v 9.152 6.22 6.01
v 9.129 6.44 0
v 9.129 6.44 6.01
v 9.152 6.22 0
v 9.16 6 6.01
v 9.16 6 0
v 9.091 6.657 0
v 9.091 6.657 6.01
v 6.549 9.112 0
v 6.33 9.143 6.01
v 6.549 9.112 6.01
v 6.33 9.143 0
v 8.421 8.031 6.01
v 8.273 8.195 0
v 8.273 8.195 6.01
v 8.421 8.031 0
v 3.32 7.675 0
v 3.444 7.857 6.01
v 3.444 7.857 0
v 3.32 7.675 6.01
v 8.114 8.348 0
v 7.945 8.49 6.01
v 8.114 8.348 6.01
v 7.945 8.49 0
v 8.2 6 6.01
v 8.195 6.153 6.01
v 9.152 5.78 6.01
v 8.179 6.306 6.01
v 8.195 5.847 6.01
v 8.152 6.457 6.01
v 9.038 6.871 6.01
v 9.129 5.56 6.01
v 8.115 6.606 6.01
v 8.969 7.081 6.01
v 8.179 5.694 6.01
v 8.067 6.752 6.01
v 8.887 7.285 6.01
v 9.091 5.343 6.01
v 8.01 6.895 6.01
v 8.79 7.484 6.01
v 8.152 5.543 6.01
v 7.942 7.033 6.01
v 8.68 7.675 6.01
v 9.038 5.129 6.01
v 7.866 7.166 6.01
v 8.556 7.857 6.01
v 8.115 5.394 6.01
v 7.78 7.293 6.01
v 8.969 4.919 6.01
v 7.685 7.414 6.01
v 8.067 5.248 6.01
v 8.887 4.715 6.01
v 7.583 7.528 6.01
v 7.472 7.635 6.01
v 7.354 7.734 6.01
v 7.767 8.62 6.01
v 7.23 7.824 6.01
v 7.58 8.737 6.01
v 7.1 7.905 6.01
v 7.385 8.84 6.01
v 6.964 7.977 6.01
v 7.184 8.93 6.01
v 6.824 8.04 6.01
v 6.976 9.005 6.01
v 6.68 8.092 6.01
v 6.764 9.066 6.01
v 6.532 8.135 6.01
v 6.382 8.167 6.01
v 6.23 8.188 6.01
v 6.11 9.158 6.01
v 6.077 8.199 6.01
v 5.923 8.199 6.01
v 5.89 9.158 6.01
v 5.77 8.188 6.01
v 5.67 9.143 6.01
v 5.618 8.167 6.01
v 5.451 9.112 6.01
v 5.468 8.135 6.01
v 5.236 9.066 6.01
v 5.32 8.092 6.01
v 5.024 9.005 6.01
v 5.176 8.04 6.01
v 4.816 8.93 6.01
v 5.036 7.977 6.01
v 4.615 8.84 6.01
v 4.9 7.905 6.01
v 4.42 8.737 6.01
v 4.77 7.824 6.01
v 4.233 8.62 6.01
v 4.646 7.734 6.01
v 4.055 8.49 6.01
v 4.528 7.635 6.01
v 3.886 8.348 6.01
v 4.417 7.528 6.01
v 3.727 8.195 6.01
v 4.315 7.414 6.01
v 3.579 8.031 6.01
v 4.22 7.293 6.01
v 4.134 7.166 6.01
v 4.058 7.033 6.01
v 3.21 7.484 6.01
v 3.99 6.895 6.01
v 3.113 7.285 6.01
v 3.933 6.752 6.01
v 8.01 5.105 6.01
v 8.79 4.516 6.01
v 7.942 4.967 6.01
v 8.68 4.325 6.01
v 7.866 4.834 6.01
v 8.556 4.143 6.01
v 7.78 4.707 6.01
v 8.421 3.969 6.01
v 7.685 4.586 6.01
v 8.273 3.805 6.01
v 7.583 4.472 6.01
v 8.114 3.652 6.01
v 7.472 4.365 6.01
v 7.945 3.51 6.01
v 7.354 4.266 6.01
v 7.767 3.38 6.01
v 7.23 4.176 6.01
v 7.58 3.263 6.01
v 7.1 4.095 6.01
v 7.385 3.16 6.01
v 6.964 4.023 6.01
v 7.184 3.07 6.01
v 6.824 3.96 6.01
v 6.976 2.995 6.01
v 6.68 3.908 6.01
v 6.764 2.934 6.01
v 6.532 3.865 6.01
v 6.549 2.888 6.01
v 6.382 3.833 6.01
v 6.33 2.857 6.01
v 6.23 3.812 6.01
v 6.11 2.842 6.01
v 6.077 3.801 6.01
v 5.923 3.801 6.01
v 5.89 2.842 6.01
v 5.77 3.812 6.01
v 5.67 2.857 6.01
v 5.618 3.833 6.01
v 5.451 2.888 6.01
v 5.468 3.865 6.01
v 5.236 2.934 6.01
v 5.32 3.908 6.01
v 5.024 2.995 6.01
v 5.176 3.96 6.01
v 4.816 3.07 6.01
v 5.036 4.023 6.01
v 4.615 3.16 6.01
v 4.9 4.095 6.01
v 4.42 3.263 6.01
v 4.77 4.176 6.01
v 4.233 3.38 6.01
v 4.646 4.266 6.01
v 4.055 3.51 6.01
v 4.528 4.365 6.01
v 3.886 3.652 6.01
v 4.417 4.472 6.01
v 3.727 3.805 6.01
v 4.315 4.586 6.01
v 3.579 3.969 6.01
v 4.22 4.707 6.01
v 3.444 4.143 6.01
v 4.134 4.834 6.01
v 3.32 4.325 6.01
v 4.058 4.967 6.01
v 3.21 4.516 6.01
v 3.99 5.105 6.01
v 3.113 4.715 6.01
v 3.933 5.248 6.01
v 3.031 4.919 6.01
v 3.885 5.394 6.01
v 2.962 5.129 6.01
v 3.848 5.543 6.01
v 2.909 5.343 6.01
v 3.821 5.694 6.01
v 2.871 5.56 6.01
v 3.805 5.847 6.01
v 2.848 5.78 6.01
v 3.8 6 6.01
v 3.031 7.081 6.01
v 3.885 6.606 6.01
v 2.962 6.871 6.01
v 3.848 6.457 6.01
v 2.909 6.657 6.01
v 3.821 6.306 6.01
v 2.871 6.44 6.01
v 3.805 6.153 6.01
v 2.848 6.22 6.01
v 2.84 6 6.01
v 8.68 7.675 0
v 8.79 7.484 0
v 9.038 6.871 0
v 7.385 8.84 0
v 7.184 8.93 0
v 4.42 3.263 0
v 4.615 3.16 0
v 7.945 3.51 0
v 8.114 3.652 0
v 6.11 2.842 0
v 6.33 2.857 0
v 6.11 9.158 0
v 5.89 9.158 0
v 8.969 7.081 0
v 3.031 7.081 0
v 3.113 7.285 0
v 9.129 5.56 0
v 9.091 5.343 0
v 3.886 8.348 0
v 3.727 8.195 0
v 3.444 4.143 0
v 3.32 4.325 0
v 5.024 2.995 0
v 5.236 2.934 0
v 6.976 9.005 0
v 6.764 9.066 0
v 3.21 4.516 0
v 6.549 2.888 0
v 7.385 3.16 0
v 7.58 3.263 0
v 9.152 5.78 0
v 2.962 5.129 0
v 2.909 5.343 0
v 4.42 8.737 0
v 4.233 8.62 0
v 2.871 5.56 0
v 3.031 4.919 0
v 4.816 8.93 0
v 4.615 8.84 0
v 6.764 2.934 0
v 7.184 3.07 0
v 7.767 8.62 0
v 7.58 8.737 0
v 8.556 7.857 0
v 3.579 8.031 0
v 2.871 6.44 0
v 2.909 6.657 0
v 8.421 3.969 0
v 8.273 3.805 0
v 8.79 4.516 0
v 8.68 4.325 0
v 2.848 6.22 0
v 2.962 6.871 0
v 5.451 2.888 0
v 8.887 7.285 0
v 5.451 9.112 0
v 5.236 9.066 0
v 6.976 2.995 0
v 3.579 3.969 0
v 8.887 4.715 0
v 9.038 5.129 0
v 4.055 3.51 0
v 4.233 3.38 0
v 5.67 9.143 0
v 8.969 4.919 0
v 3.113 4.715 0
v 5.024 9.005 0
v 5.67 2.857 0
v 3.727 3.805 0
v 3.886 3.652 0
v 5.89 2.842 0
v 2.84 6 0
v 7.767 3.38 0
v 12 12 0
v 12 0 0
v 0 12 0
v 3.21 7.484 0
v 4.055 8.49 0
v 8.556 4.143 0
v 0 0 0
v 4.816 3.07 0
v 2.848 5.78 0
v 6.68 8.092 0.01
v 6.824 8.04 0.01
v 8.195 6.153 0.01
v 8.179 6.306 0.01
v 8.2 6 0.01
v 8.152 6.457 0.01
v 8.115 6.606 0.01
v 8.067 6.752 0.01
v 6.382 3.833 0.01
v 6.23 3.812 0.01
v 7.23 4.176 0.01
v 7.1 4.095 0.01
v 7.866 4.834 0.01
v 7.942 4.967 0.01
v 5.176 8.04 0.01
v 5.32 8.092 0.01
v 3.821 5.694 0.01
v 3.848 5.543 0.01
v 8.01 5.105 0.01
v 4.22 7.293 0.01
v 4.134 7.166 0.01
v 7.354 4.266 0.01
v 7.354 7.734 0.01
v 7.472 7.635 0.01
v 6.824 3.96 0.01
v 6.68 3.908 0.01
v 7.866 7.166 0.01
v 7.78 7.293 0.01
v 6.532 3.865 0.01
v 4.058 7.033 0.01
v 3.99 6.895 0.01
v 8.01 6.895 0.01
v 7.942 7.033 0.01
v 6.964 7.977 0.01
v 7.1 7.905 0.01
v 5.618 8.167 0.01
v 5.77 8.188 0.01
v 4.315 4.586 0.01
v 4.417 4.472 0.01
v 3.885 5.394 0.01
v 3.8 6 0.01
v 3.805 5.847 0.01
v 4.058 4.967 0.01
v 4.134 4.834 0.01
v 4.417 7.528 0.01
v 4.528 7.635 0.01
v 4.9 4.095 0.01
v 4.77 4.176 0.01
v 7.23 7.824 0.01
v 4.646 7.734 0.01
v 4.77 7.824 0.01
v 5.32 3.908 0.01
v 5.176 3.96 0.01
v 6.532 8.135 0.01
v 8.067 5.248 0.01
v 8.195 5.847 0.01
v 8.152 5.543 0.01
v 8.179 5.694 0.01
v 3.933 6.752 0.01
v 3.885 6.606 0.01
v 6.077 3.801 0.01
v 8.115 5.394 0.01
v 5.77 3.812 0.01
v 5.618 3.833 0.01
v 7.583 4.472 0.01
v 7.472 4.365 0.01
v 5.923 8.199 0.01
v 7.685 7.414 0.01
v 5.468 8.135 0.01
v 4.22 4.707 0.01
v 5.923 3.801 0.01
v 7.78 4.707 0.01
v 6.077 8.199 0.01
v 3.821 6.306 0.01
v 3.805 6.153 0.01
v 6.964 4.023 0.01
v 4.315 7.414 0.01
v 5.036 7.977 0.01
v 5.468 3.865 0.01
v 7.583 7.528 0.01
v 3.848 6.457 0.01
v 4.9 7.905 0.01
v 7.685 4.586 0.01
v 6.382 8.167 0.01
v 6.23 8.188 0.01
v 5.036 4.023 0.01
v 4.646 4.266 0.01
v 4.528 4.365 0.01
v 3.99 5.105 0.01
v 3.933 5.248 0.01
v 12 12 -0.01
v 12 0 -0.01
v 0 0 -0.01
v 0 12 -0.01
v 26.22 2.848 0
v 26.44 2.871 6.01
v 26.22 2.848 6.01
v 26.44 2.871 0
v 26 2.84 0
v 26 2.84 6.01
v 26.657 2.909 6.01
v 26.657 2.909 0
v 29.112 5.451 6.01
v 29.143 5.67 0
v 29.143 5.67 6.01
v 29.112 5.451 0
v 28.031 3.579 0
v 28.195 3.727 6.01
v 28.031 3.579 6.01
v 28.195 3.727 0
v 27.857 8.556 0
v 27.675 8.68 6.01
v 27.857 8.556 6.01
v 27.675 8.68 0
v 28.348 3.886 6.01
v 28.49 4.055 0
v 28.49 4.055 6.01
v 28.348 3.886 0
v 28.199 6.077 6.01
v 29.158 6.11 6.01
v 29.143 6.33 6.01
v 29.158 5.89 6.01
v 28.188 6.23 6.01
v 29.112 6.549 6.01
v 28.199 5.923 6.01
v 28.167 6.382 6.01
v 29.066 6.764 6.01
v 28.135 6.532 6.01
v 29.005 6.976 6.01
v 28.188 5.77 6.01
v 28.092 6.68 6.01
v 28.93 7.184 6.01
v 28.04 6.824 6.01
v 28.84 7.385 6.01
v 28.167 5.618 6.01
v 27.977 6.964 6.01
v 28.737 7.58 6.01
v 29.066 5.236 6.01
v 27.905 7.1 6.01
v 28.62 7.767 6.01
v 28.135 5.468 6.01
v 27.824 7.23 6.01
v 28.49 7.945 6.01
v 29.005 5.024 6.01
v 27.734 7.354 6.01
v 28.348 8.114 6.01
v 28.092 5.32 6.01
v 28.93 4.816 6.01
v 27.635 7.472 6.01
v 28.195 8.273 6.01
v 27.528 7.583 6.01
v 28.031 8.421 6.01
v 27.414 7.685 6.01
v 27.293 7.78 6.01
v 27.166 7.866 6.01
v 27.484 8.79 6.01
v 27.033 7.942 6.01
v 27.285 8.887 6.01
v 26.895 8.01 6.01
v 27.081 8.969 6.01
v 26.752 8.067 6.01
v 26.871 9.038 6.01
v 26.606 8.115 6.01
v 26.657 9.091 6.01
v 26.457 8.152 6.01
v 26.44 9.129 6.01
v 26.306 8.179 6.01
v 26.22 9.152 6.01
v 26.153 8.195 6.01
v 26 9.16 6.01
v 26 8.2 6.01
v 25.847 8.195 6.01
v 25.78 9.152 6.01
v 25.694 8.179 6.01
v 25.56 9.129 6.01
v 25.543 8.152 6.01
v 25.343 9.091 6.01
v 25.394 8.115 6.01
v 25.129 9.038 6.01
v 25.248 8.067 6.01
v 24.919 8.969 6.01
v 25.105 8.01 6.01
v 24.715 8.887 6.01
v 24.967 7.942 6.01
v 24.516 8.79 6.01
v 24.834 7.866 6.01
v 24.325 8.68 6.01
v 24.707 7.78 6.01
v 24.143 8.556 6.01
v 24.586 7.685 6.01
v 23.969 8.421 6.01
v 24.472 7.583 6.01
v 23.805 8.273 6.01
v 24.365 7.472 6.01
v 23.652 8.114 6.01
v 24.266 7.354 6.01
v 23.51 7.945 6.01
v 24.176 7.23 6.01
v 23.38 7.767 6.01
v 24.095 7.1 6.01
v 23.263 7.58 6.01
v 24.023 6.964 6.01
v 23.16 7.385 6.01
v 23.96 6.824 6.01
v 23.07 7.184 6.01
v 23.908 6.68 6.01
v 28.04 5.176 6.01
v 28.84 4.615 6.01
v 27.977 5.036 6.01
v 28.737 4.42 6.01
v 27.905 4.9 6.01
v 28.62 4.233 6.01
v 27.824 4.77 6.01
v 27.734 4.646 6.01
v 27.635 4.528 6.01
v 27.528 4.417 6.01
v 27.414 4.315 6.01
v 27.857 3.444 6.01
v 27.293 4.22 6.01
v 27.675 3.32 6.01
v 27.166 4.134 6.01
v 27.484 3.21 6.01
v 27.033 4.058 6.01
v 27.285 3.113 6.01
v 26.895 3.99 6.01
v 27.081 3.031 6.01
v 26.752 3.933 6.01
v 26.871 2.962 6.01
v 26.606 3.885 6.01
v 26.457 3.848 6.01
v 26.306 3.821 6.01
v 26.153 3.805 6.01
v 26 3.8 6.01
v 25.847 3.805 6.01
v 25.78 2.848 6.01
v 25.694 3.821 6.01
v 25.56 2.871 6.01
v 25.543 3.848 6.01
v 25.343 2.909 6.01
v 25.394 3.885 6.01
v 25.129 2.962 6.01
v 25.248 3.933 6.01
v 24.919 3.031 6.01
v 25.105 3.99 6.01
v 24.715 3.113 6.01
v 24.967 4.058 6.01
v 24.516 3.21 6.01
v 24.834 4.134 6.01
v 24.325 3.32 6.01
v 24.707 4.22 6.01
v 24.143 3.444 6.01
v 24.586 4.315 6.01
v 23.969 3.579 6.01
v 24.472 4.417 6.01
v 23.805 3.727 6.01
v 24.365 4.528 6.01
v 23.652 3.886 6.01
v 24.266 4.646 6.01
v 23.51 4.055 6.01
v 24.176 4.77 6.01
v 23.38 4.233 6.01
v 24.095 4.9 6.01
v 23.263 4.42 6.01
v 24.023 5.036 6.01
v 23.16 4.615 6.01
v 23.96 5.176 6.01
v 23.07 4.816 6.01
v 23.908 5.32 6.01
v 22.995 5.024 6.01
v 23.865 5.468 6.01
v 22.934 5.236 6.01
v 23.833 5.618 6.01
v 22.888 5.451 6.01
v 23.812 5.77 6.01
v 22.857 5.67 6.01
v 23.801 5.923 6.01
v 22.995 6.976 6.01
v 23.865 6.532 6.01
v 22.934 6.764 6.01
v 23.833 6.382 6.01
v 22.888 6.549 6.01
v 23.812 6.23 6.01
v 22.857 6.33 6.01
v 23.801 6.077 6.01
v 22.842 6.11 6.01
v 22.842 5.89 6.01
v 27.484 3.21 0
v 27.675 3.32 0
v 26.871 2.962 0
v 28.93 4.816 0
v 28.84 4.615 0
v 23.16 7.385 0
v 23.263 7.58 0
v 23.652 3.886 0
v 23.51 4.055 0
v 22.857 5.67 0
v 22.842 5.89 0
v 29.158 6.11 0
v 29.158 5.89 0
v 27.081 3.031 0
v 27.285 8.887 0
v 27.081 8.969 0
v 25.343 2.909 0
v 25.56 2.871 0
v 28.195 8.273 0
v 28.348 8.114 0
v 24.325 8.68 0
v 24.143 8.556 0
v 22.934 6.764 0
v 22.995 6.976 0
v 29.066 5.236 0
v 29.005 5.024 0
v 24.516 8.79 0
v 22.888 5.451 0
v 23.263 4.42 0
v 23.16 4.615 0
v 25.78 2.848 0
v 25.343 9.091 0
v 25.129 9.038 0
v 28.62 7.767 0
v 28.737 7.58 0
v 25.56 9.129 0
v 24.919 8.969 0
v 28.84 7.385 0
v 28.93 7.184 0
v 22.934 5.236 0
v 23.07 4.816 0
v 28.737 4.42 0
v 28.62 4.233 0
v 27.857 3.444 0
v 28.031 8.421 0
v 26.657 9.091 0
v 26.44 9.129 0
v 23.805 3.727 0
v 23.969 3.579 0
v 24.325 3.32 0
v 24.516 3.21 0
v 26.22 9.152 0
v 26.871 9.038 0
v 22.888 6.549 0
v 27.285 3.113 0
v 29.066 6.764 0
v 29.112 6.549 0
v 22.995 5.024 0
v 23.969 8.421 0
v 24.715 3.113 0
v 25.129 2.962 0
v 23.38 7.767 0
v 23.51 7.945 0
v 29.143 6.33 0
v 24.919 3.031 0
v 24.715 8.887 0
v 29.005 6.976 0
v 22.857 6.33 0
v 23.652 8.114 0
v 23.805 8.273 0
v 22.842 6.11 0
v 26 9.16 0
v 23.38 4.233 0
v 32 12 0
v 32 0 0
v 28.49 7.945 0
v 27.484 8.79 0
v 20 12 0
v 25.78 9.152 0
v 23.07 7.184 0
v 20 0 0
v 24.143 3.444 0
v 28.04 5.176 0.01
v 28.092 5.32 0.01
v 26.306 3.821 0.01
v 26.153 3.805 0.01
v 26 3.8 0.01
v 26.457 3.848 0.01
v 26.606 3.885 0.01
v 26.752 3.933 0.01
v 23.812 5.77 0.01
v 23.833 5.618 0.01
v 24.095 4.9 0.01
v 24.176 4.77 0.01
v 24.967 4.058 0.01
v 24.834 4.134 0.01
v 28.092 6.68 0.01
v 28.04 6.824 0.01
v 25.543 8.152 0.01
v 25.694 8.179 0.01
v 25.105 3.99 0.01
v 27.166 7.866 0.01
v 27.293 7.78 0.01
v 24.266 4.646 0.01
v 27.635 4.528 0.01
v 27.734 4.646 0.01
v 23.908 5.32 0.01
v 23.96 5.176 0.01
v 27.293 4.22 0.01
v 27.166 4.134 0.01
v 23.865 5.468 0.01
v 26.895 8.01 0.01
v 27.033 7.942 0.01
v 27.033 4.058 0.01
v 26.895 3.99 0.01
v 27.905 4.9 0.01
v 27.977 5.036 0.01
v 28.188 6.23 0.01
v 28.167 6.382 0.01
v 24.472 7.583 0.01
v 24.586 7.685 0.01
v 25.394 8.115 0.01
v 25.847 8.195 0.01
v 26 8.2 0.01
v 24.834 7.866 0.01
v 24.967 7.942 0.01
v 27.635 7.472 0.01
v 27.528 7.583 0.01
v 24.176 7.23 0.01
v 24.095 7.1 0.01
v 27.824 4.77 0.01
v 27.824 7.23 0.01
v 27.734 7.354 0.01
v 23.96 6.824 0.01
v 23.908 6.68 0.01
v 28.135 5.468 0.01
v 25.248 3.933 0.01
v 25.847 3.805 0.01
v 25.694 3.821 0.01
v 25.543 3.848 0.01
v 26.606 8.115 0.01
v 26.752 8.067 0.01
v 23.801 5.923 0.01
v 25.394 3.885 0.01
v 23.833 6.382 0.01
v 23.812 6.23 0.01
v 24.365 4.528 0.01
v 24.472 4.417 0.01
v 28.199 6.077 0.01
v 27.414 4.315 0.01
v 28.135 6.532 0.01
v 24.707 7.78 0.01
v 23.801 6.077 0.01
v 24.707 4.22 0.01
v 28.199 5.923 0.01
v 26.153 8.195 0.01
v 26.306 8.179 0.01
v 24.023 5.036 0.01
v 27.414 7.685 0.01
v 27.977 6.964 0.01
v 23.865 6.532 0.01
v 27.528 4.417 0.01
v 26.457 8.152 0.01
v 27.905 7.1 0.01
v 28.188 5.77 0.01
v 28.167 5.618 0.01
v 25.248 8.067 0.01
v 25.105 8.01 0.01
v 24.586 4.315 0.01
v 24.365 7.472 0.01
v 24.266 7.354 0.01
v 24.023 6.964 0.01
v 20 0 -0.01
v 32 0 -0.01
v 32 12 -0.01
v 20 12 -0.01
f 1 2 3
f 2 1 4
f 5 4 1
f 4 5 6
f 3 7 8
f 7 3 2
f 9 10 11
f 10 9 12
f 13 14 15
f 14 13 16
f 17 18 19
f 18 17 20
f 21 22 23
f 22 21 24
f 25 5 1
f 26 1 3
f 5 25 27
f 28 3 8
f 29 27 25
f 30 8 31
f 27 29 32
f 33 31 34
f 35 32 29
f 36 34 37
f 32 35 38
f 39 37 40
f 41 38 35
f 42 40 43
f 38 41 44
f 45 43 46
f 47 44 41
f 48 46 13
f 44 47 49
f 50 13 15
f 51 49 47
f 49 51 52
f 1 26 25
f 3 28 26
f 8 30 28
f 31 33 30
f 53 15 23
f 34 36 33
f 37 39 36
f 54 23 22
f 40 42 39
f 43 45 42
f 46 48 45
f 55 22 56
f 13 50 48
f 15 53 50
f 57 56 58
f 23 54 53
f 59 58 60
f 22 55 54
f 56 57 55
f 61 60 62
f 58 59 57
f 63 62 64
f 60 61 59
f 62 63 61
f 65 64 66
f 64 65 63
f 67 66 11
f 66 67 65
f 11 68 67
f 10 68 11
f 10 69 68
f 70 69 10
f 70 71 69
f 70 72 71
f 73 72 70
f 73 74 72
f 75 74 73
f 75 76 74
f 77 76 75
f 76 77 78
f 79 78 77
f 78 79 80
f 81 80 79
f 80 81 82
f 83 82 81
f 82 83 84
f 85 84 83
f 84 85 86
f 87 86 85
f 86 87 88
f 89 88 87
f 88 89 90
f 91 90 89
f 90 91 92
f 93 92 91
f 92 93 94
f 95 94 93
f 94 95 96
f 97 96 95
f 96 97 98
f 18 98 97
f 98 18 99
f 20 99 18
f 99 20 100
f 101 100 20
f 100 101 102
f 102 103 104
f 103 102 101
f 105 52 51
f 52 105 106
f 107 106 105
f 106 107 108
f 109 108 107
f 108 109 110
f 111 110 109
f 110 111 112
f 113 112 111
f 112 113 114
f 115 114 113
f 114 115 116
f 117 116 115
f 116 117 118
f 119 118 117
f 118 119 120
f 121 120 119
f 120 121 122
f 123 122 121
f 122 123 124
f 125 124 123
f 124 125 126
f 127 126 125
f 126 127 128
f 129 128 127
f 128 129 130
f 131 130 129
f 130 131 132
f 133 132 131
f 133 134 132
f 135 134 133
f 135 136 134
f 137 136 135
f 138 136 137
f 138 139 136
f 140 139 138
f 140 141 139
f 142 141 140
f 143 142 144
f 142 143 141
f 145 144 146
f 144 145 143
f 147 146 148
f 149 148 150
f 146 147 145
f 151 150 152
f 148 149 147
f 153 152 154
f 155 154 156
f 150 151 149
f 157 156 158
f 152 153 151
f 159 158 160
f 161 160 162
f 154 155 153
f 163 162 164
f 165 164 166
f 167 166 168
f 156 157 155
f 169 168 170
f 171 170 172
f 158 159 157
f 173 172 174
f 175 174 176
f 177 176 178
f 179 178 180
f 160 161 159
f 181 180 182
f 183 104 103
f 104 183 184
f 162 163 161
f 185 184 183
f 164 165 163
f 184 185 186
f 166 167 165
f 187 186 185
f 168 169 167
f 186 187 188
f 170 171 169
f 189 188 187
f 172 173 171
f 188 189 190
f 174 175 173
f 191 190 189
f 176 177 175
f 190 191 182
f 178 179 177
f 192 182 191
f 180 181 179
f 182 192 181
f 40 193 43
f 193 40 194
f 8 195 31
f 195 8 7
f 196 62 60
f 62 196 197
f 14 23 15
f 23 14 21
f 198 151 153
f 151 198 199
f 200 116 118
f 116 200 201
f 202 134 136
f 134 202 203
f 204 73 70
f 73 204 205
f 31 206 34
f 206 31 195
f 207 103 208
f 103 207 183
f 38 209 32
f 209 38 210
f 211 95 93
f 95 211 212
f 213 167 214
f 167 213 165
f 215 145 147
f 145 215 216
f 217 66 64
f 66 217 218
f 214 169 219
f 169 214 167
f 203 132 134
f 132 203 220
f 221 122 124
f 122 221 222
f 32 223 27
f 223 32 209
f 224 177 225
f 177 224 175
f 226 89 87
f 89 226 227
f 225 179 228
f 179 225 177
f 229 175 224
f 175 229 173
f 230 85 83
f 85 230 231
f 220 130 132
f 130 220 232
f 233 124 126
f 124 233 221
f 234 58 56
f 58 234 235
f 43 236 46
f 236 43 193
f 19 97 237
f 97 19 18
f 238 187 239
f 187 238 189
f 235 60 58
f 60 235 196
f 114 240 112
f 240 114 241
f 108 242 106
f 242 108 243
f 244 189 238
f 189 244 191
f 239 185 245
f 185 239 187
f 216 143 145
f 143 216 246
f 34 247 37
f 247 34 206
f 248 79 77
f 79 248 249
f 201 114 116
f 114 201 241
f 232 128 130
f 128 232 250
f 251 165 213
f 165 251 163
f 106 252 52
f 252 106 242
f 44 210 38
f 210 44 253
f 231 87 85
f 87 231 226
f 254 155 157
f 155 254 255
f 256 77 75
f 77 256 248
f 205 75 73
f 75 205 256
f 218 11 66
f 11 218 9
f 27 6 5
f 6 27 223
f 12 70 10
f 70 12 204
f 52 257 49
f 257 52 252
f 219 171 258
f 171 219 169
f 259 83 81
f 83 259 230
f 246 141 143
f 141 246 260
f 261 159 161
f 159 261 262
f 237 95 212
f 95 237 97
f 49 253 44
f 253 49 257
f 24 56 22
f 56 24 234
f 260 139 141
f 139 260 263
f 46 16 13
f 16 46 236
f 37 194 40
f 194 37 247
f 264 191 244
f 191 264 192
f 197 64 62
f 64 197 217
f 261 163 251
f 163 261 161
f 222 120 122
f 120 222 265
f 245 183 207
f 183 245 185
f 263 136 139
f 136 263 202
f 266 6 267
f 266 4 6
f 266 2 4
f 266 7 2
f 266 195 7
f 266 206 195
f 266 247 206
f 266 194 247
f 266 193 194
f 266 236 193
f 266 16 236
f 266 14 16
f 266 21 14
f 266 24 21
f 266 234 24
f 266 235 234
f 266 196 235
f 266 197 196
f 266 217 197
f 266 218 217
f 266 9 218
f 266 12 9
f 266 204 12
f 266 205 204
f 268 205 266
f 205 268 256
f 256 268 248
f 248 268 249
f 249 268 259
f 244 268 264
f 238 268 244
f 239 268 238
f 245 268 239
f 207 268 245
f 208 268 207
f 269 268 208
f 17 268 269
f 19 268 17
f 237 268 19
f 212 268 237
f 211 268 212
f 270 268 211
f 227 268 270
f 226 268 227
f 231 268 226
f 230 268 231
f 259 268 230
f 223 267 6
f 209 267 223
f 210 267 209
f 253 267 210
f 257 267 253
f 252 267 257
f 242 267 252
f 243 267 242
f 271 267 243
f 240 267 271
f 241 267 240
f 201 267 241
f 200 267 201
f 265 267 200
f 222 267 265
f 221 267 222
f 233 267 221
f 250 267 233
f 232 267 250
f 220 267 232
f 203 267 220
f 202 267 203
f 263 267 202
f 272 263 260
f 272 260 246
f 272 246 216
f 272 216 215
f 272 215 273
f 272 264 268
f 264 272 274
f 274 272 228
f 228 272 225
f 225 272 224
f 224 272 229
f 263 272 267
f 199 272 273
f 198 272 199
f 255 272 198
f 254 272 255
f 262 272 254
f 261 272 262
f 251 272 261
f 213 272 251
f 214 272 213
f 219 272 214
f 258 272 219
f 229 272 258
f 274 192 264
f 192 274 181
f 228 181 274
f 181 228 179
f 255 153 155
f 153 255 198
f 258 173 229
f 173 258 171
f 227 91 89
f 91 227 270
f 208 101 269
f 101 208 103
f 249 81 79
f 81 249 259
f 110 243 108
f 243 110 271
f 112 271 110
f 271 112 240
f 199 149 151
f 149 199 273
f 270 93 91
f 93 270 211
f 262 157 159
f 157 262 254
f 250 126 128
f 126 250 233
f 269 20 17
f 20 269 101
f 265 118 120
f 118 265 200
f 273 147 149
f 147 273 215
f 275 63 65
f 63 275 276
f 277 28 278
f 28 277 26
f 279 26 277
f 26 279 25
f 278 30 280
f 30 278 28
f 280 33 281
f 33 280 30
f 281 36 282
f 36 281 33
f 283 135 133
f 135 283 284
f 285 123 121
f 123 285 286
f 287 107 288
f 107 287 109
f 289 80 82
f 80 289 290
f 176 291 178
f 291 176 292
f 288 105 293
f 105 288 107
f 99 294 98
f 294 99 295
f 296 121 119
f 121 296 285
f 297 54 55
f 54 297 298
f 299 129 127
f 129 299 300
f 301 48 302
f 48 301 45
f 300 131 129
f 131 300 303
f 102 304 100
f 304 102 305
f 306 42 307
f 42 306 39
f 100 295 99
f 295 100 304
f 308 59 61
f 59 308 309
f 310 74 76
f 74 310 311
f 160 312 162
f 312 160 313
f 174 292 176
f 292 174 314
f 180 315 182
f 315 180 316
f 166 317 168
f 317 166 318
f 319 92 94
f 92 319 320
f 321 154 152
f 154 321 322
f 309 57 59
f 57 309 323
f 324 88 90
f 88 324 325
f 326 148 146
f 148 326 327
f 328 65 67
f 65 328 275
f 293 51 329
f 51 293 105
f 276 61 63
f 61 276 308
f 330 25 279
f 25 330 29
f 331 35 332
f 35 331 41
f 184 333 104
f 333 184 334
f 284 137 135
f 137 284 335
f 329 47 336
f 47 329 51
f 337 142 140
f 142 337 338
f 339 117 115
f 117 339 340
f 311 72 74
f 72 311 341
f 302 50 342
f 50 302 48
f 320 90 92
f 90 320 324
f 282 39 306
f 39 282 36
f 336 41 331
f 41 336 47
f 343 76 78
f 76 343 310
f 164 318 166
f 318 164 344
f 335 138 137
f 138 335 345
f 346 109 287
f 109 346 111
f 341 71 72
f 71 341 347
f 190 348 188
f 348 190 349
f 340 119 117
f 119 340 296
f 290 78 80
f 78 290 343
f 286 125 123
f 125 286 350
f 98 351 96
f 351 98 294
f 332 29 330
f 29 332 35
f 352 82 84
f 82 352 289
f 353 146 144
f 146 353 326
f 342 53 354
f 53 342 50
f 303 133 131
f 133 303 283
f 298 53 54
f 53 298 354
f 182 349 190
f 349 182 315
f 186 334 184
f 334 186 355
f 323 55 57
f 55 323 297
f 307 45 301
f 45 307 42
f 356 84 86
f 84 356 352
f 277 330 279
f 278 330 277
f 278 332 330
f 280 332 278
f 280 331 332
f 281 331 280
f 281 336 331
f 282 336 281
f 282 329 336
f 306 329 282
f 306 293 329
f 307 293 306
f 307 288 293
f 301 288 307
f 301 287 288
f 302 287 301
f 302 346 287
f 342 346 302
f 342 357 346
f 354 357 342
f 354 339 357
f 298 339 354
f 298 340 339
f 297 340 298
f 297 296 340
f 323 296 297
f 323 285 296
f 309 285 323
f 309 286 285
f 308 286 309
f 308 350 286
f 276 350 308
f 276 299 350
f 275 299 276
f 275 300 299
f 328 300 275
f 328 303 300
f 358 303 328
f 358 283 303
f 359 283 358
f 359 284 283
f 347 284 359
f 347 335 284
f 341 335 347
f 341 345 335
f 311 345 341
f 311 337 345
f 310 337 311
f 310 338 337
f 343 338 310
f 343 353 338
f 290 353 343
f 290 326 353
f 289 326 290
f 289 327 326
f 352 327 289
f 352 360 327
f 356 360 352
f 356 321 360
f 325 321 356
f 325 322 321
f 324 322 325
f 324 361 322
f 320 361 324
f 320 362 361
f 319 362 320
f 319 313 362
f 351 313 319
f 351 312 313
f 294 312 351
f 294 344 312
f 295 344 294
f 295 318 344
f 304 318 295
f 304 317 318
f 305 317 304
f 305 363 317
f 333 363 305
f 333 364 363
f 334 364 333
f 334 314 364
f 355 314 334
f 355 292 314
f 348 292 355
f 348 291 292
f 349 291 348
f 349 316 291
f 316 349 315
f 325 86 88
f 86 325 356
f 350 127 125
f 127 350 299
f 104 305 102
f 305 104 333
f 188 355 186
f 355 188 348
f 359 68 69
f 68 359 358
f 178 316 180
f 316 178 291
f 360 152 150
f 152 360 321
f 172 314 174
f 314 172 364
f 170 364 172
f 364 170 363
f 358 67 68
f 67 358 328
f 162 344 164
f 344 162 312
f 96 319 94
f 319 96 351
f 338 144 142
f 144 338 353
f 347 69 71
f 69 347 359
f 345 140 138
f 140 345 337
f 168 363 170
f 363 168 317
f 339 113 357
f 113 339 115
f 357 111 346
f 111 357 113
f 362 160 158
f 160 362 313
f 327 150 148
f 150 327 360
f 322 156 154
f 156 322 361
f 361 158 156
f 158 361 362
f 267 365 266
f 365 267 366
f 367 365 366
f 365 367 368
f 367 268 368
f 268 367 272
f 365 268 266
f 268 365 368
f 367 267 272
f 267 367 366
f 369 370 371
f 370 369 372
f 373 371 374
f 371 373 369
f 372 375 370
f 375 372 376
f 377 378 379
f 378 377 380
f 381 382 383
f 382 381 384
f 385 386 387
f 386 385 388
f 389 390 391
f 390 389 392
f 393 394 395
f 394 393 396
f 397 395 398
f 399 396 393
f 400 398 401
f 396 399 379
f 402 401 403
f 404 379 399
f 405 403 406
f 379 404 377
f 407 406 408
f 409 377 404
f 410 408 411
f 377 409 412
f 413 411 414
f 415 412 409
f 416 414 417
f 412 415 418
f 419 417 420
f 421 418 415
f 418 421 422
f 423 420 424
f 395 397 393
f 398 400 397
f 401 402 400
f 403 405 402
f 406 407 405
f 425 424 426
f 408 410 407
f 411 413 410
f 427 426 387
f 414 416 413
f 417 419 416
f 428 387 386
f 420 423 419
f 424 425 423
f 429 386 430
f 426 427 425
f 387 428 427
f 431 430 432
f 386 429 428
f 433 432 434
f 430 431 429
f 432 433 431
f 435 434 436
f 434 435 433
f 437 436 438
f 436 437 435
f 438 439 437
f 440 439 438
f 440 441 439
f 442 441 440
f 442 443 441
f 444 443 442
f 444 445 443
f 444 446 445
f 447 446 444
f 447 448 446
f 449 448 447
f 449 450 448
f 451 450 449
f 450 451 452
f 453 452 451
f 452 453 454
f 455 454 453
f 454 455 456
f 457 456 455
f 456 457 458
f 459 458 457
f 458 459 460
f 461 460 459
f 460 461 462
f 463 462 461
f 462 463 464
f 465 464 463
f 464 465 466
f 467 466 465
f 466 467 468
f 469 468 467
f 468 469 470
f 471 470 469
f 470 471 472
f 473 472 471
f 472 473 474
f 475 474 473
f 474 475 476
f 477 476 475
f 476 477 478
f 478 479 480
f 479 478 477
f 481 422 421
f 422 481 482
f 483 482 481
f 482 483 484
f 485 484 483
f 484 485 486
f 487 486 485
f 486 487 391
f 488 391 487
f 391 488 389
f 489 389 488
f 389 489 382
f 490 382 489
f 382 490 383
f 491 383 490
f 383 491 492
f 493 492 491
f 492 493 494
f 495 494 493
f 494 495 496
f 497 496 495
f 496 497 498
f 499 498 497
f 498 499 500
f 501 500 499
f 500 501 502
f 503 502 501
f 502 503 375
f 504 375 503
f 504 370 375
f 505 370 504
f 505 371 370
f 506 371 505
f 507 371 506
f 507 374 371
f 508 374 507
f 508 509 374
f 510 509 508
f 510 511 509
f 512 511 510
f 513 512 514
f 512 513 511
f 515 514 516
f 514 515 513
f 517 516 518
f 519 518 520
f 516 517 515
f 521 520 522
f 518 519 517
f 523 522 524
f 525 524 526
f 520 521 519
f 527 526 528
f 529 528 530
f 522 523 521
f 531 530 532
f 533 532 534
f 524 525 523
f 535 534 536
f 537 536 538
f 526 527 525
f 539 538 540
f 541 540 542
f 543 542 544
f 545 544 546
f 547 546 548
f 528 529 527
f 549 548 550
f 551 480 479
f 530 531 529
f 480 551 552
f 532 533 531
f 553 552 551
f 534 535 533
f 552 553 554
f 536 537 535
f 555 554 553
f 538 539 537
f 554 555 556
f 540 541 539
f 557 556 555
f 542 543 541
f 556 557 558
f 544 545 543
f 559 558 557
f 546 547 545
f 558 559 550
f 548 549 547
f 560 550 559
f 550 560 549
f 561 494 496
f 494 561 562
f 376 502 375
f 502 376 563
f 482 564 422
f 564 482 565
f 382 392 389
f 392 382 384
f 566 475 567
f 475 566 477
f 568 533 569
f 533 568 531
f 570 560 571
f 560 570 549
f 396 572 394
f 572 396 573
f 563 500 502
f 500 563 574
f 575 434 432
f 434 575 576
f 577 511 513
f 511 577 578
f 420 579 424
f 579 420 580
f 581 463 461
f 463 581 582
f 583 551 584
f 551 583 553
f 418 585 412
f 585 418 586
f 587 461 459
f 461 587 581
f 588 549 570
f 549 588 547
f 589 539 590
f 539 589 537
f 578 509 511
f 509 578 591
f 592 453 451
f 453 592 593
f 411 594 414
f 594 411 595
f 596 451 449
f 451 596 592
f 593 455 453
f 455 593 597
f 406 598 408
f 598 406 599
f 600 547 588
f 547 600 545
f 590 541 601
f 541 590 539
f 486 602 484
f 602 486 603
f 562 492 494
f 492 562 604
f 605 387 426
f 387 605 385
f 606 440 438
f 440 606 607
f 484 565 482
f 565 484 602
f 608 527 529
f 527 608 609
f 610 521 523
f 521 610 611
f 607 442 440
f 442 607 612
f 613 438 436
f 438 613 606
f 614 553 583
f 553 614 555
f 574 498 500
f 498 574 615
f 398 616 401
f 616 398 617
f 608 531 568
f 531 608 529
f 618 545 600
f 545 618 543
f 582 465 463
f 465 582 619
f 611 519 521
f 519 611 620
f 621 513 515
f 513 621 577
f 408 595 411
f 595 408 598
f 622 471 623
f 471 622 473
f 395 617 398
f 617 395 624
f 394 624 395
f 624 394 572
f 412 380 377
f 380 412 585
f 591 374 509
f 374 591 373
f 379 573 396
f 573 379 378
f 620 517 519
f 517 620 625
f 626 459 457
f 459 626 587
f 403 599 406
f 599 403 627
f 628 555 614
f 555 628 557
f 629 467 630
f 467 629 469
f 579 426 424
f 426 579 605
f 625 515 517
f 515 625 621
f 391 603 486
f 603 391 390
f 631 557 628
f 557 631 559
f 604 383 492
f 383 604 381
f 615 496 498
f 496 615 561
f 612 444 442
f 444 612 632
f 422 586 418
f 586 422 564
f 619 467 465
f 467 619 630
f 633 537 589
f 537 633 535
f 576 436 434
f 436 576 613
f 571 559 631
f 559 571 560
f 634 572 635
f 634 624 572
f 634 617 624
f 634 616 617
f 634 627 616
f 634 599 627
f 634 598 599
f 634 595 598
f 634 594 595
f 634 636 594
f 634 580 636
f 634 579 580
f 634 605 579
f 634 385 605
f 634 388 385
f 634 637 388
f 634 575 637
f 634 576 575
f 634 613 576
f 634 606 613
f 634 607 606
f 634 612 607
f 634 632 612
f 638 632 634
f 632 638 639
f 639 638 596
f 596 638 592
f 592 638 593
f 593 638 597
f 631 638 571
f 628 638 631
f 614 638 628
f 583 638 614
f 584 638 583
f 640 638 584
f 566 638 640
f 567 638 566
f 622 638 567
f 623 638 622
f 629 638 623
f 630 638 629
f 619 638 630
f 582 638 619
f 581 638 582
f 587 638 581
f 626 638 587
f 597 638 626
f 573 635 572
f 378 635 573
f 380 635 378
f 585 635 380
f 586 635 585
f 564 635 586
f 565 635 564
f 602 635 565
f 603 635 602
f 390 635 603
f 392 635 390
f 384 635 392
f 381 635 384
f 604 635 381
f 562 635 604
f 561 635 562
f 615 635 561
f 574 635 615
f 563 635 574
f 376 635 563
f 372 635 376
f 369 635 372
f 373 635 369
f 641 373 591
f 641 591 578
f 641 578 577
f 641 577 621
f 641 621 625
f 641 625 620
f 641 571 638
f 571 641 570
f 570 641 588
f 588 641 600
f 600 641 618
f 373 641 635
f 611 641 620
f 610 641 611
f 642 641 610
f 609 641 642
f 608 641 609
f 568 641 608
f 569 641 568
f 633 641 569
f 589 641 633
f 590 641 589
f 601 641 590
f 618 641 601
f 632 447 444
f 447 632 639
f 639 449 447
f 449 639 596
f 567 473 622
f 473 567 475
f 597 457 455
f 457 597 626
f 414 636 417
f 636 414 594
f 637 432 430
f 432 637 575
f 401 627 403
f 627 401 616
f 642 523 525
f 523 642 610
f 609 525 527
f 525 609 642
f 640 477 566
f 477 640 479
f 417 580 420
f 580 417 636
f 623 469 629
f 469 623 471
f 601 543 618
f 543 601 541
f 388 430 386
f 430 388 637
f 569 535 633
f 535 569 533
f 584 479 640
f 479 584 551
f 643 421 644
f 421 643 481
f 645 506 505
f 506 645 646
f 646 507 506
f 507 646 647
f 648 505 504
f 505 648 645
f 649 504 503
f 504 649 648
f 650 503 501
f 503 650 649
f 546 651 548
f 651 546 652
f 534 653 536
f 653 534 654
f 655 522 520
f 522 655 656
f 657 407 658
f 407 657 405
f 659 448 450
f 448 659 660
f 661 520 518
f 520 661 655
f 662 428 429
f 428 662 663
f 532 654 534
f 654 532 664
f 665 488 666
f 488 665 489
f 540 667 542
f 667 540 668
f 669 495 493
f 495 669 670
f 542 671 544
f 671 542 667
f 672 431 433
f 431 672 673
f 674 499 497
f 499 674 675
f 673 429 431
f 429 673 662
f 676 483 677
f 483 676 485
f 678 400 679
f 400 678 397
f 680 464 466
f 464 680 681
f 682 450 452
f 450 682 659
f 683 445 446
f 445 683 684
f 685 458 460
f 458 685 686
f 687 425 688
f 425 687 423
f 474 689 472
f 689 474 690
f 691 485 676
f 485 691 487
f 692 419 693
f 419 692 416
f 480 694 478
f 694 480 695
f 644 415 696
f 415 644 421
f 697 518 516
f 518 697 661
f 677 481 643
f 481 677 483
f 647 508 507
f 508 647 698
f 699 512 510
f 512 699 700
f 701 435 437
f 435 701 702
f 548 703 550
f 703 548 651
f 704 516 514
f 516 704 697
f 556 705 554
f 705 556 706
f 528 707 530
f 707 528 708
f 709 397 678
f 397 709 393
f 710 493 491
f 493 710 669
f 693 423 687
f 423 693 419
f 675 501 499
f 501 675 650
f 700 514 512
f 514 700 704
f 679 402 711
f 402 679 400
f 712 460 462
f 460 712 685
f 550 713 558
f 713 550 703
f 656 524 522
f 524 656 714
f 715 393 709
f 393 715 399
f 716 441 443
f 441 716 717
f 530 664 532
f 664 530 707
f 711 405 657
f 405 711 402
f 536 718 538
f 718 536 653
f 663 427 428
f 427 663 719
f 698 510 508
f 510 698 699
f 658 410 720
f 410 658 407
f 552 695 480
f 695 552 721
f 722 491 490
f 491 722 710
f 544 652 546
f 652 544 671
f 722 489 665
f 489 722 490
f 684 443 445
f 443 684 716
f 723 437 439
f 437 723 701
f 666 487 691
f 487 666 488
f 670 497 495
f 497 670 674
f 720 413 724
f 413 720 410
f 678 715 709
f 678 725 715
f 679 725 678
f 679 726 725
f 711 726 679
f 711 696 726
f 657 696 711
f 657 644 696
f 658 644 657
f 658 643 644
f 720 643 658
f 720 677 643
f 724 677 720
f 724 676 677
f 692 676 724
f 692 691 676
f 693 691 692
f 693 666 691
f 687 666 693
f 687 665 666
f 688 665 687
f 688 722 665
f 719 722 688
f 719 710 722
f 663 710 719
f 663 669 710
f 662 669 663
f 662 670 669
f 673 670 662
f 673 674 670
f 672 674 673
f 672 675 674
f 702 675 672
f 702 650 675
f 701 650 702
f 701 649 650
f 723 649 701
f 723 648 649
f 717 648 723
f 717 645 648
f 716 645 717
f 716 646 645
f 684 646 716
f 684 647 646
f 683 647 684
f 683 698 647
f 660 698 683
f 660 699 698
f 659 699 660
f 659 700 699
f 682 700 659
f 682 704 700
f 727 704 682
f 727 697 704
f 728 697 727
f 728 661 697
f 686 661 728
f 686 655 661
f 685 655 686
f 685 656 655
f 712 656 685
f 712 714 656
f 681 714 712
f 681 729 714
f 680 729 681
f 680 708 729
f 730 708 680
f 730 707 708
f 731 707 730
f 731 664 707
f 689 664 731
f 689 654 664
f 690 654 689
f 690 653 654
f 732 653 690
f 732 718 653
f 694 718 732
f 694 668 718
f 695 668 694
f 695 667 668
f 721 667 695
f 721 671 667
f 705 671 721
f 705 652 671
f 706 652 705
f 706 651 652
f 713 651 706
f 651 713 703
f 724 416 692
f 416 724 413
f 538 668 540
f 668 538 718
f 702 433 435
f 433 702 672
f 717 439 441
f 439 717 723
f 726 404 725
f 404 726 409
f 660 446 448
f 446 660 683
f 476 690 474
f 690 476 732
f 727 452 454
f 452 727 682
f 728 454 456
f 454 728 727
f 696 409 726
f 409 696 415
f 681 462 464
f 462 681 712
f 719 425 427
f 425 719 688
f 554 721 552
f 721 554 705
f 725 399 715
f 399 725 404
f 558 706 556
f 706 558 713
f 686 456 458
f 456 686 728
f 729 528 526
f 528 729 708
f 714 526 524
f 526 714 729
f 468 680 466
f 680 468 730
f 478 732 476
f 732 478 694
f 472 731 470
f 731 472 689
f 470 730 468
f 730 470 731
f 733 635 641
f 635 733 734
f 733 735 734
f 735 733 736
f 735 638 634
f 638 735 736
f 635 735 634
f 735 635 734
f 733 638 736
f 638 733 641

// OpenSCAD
// file: ../../Base/Boxes.scad
// Fischertechnik Box Foundation
// Pre-designed Boxes

use <Constants.scad>

include <PlacementOptions.scad>

box190Width = 190;
box190Depth = 130;
box130Width = 130;
box130Depth = 95;

// Values are from an original ec3 box
topBottomDifference = 1.5;
outerHeight = 40;
innerHeight = 38.2;
baseThickness = outerHeight - innerHeight;
stackExcess = 5.7;
radius = 3.5;
wallThickness = 1.5;
tolerance = 0.2;
stackOffset = innerHeight - stackExcess;

boxUsageHeight = stackOffset;
boxWallThickness = wallThickness;
boxBaseThickness = baseThickness;
boxWebWidth = 3.0;

// getBoxWallThickness()
// Gets the wall thickness of a Fischertechnik Box
function getBoxWallThickness() = boxWallThickness;

// getBoxUsageHeight()
// Gets the usable height of a Fischertechnik box
function getBoxUsageHeight() = boxUsageHeight;

// getBoxInnerHeight()
// Gets the inner height of a Fischertechnik box, including the stack excess
function getBoxInnerHeight() = innerHeight;

// getBoxBaseThickness()
// Gets the thickness of the Fischertechnik box base.
function getBoxBaseThickness() = boxBaseThickness;

// getBoxWebWidth()
// Gets the width of a box web
function getBoxWebWidth() = boxWebWidth;

// getBox190Space()
// Gets the usable inner space of a Box 190 as an x/y-list
function getBox190Space() = [
    box190Width - 2*getBoxWallThickness() - topBottomDifference, 
    box190Depth - 2*getBoxWallThickness() - topBottomDifference ];

// BoxBase(width, depth)
// Creates an empty stackable Fischertechnik compatible box
// width = Outer width of the box (190, 130, ...)
// depth = Outer depth of the box (130, 95, ...)

module BoxBase(width, depth, height=outerHeight) {    
    thinPlate = 0.01;

    innerHeight = height - baseThickness;    
    
    module BodyPlate(width, depth) {
        translate([radius, radius])
        hull() {
            w = width-2*radius;
            d = depth-2*radius;
            cube([w, d, thinPlate]);
            cylinder(thinPlate, r=radius, $fn=getFragments());
            translate([w, 0])
                cylinder(thinPlate, r=radius, $fn=getFragments());
            translate([w, d])
                cylinder(thinPlate, r=radius, $fn=getFragments());
            translate([0, d])
                cylinder(thinPlate, r=radius, $fn=getFragments());
        }
    }
    
    module Body(tolerance=tolerance) {
        hull() {
            // Bottom with tolerance to fit into the original boxes when stacked
            translate([-wallThickness+tolerance, -wallThickness+tolerance, -baseThickness])
                BodyPlate(width-topBottomDifference-2*tolerance, depth-topBottomDifference-2*tolerance);
            
            // Top
            translate([-wallThickness-topBottomDifference/2, -wallThickness-topBottomDifference/2, innerHeight-thinPlate])
                BodyPlate(width, depth);
         }
    }

    module Cutoff() {
        hull() {
            coWidth = width - 2*wallThickness;
            coDepth = depth - 2*wallThickness;
            
            // Bottom
            BodyPlate(coWidth-topBottomDifference, coDepth-topBottomDifference);

            // Top
            translate([-topBottomDifference/2, -topBottomDifference/2, innerHeight+thinPlate]) 
                BodyPlate(coWidth, coDepth);
        }
    }
    
    difference() {        
        Body();
        Cutoff();
        stackOffset = innerHeight - stackExcess;
        translate([0, 0, stackOffset + baseThickness])
            Body(tolerance=0);
    }
}

// Creates the Fischertechnik empty box 130x190 mm and places it at position 0,0
// 190x130 are the outer sizes, the inner space is slightly smaller. Use getBox190Space() to get the inner sizes.
// The box is positioned that the usable inner space is at the 0,0,0 position. The

module Box190() {
    BoxBase(box190Width, box190Depth);
}

// Gets the usable inner space of a Box 130 as an x/y-list
function getBox130Space() = [
    box130Width - 2*getBoxWallThickness(), 
    box130Depth - 2*getBoxWallThickness() ];

// Creates the Fischertechnik empty box 95x130 mm and places it at position 0,0
// 190x130 are the outer sizes, the inner space is slightly smaller. Use getBox190Space() to get the inner sizes.
// The box is positioned that the usable inner space is at the 0,0,0 position. The

module Box130() {
    BoxBase(box130Width, box130Depth);
}

// Creates a web at the specified box walls
// corner 0 = LowerLeft, 1 = UpperLeft, 2 = UpperRight, 3 = LowerRight
// side 0 = LeftOfCorner, 1 = RightOfCorner
// distance = Distance in mm from the corner
// boxSpace = inner width and depth of the box (default: Box 190)
// webWidth = length of the web (default is 3 mms)
// webThickness = thickness of the web (default is 1 mm)

module BoxWeb(corner, side, distance, boxSpace=getBox190Space(), webWidth=getBoxWebWidth(), webThickness=1.0) {
    sink = getBoxWallThickness()/2;

    width = (corner % 2 == 0) ? 
            (side == LeftOfCorner ? webWidth : webThickness) :
            (side == LeftOfCorner ? webThickness : webWidth);

    depth = (corner % 2 == 0) ? 
            (side == RightOfCorner ? webWidth : webThickness) :
            (side == RightOfCorner ? webThickness : webWidth);
    
    xDiff = corner == LowerLeft ? 
                (side == LeftOfCorner ? -sink : distance) :
            (corner == UpperLeft ?                
                (side == LeftOfCorner ? distance : -sink) :
            (corner == UpperRight ?
                (side == LeftOfCorner ? boxSpace.x-webWidth+sink : boxSpace.x-distance-webThickness) :
                (side == LeftOfCorner ? boxSpace.x-distance-webThickness: boxSpace.x-webWidth+sink)));

    yDiff = corner == LowerLeft ? 
                (side == RightOfCorner ? -sink : distance) :
            (corner == UpperLeft ?
                (side == RightOfCorner ? boxSpace.y-distance : boxSpace.y-webWidth+sink) :
            (corner == UpperRight ?
                (side == RightOfCorner ? boxSpace.y-webWidth+sink : boxSpace.y-distance) :
                (side == RightOfCorner ? distance : -sink)));
    
    translate([xDiff, yDiff, -getExcess()])
        cube([width, depth, boxUsageHeight + 2*getExcess()]);
}
// file: ../../Base/Rotation.scad
// Fischertechnik Box Foundation
// Geometry Helpers Rotation

include <PlacementOptions.scad>

// getRotatedSpace(space, rotation=NoRotation)
// Rotates the space dependent on the specified rotation

function getRotatedSpace(space, rotation=NoRotation) = [
    (rotation == Rotate90 || rotation == Rotate270) ? space.y : space.x,
    (rotation == Rotate90 || rotation == Rotate270) ? space.x : space.y
];

// Rotates the given space around the fixed left lower corner
// space = the space the children needs as width/depth list [width,depth]
// rotation = 0 Rotate0 degrees, 1 Rotate90 degrees, 2 Rotate180 degrees, 3 Rotate270 degrees (equivalent to -90)

module RotateFix(space, rotation=NoRotation) {
    dy = (rotation == Rotate0 || rotation == Rotate270) ? 0 :
        (rotation == Rotate90) ? space.x :
        space.y;
    dx = (rotation < Rotate180) ? 0 :
        (rotation == Rotate180) ? space.x :
        space.y;
    
    translate([dx, dy, 0])
        rotate([0, 0, rotations[rotation]])
            children();
}
// file: ../../Base/Alignment.scad
// Fischertechnik Box Foundation
// Geometry Helpers Alignment

include <PlacementOptions.scad>

// getAlignedX(elementWidth, spaceWidth, align=AlignRight, offset=0)
// Gets the aligned X offset of an element with the given
// width in the given space.
// elementWidth = The width of the element to positon
// spaceWidth = The space where the element should be aligned
// align = 0 AlignLeft, 1 AlignCenter, 2 AlignRight
// offset = an optional offset from the aligned position. When
// aligned left or centered, then positive values are in X direction.
// When aligned right then positive values are in negative X direction.

function getAlignedX(elementWidth, spaceWidth, align=AlignRight, offset=0) =
    (align == AlignLeft) ?
        offset :
        ((align == AlignCenter) ?
        (spaceWidth - elementWidth)/2 + offset :
        spaceWidth - offset - elementWidth);

// getAlignedY(elementDepth, spaceDepth, align=AlignTop, offset=0)
// Gets the aligned Y offset of an element with the given
// depth in the given space.
// elementDepth = The depth of the element to positon
// spaceDepth = The space where the element should be aligned
// align = 0 AlignBottom, 1 AlignCenter, 2 AlignTop
// offset = an optional offset from the aligned position. When
// aligned bottom or centered, then positive values are in Y direction.
// When aligned top then positive values are in negative Y direction.

function getAlignedY(elementDepth, spaceDepth, align=AlignTop, offset=0) =
    (align == AlignBottom) ?
        offset :
        ((align == AlignCenter) ?
        (spaceDepth - elementDepth)/2 + offset :
        spaceDepth - offset - elementDepth);
// file: ../../Base/Constants.scad
// Fischertechnik Box Foundation
// Constants

// Constant values necessary for multiple elements

// Base constants
dividerThickness = 1.2;
excess = 0.01;
fragments = 90;
tolerance = 0.8;

// Gets the thickness of a divider 
function getDividerThickness() = dividerThickness;

// Gets the excess that is used to merge walls into each other
function getExcess() = excess;

// Gets amount of fragments of a cylinder
function getFragments() = fragments;

// Gets the inner tolerance of a frame to each side
function getTolerance() = tolerance;


// Fischertechnik specific constants
axisDiameter = 4;
axisBottomDiameter = axisDiameter + 1;
standardEdgeDistance = 2.5;
standardWebDistance = 11.5;
standardCornerLength = 15;
tubeWallFactor = 0.8;
smallPartsFrameHeight = 20;

// Gets axis diameter
function getAxisDiameter() = axisDiameter;

// Gets axis bottom diameter for thicker part at the bottom
function getAxisBottomDiameter() = axisBottomDiameter;

// gets the standard distance to the wall of the box for dockable frames with webs
function getStandardEdgeDistance() = standardEdgeDistance;

// gets the standard distance of each web to the corner of the dockable frame
function getStandardWebDistance() = standardWebDistance;

// gets the standard length of the corner walls of a dockable frame
function getStandardCornerLength() = standardCornerLength;

// gets the wall thickness of a tube.
function getTubeWallThickness() = tubeWallFactor * getDividerThickness();

// gets the frame height for docked small parts boxes.
function getSmallPartsFrameHeight() = smallPartsFrameHeight;
// file: ../../Base/PlacementOptions.scad
// Fischertechnik Box Foundation
// Placement Options

// Alignment
NoAlign = 0;
AlignLeft = 1;
AlignBottom = 2;
AlignCenter = 3;
AlignRight = 4;
AlignTop = 5;

// Element rotation degree steps
rotations = [0, -90, -180, -270];

// Rotation
NoRotation = 0;
Rotate0 = 0;
Rotate90 = 1;
Rotate180 = 2;
Rotate270 = 3;

// Docking (seen from above)
NoDock = -1;
DockLeft = 0;
DockTop = 1;
DockRight = 2;
DockCorner = 2;
DockBottom = 3;

// Web corners
LowerLeft = 0;
UpperLeft = 1;
UpperRight = 2;
LowerRight = 3;

// Web position relative to corner
LeftOfCorner = 0;
RightOfCorner = 1;
// file: ../../Elements/CylinderAxis30.scad
// Fischertechnik Box Library
// Cylinder for standing 30 mm axis
// 31034

use <../Base/Constants.scad>
use <../Base/Placement.scad>
use <../ModelBase/Simple.scad>
use <../ModelBase/Complex.scad>

width = 12;
depth = 12;
height = 6;

// getCylinderAxis30Space()
// Gets the space the cylinder for a 30 mm axis needs

function getCylinderAxis30Space() = [width, depth, height];

// CylinderAxis30()
// Standing cylinder for axis 30
// 31034

module CylinderAxis30() {
    Space(getCylinderAxis30Space());
    
    Center(getCylinderAxis30Space())
        Tube(height, innerDiameter=getFrameAxisDepth());
}

// Tests
color("lightgray")
CylinderAxis30();
// file: ../../Base/Placement.scad
// Fischertechnik Box Foundation
// Geometry Helpers Placement

use <Constants.scad>
use <Alignment.scad>
use <Rotation.scad>
use <Boxes.scad>

include <PlacementOptions.scad>

// Place(x=0, y=0, elementSpace=[0,0], alignX=AlignLeft, alignY=AlignBottom, rotation=Rotate0, boxSpace=getBox190Space())
// Places the child at the specified position
// y = Y-Position. This is a relative position when an X aligment is specified.
// x = X-Position. This is a relative position when an Y aligment is specified.
// elementSpace = space of the element to be placed [x,y]
// alignX = -1=NoAlign, 0 AlignLeft, 1 AlignCenter, 3 AlignRight (elementSpace and boxSpace required!)
// alignY = -1=NoAlign, 2 AlignBottom, 1 AlignCenter, 4 AlignTop (elementSpace and boxSpace required!)
// rotation = 0 Rotate0 0 degrees, 1 Rotate90 90 degrees, 
// 2 Rotate180 180 degrees, 3 Rotate270 270 degrees (equivalent to -90)
// boxSpace = Inner space of the box where the placement occurs [x,y] - default is Box 190x130 inner space

module Place(x=0, y=0, elementSpace=[0,0], 
  alignX=AlignLeft, alignY=AlignBottom, 
  rotation=NoRotation, boxSpace=getBox190Space()) {

    module Position(x, y, space, rotation=Rotate0) {
        translate([x, y, 0])
            RotateFix(space, rotation)
                children();
    }

    space = getRotatedSpace(elementSpace, rotation);
    alignedX = getAlignedX(space.x, boxSpace.x, alignX, x);
    alignedY = getAlignedY(space.y, boxSpace.y, alignY, y);
    Position(alignedX, alignedY, elementSpace, rotation)
        children();
}

// Center(space=getBox130Space(), elementSpace=[0,0])
// space = Space where the children is centered. For cylinder use centered=true and no elementSpace.
// elementSpace = space of the element to be centered [x,y]

module Center(space=getBox190Space(), elementSpace=[0,0]) {
    Place(elementSpace=elementSpace, boxSpace=space, alignX=AlignCenter, alignY=AlignCenter)
        children();
}

// CenterHorizontal(width=0, y=0, offset=0, space=getBox130Space())
// width = Width of the element to be placed.
// y = Y position of the element
// offset = Offset from the center position (negative will be left of the center)
// space = Space where the element is placed

module CenterHorizontal(width=0, y=0, offset=0, space=getBox190Space()) {
    Place(x=offset, y=y, elementSpace=[width, 0], boxSpace=space, alignX=AlignCenter)
        children(0);
}

// CenterVertical(depth=0, x=0, offset=0, space=getBox130Space())
// depth = Depth of the element to be placed.
// x = X position of the element
// offset = Offset from the center position (negative will be down of the center)
// space = Space where the element is placed

module CenterVertical(depth=0, x=0, offset=0, space=getBox190Space()) {
    Place(x=x, y=offset, elementSpace=[0, depth], boxSpace=space, alignY=AlignCenter)
        children(0);
}

// getIsVertical(align)
// True if the specified alignment needs a vertical orientation for a divider (AlignRight, AlignLeft)

function getIsVertical(align) = (align == AlignRight || align == AlignLeft);

// getIsHorizontal(align)
// True if the specified alignment needs a horizontal orientation for a divider (AlignTop, AlignBottom)

function getIsHorizontal(align) = (align == AlignTop || align == AlignBottom);
// main file
// Fischertechnik Box Foundation
// Elements
// Test CylinderAxis30

use <../../Base/Placement.scad>
use <../../Elements/CylinderAxis30.scad>

include <../../Base/PlacementOptions.scad>

CylinderAxis30();

Place(20, 0, getCylinderAxis30Space(), rotation=Rotate90)
    CylinderAxis30();
